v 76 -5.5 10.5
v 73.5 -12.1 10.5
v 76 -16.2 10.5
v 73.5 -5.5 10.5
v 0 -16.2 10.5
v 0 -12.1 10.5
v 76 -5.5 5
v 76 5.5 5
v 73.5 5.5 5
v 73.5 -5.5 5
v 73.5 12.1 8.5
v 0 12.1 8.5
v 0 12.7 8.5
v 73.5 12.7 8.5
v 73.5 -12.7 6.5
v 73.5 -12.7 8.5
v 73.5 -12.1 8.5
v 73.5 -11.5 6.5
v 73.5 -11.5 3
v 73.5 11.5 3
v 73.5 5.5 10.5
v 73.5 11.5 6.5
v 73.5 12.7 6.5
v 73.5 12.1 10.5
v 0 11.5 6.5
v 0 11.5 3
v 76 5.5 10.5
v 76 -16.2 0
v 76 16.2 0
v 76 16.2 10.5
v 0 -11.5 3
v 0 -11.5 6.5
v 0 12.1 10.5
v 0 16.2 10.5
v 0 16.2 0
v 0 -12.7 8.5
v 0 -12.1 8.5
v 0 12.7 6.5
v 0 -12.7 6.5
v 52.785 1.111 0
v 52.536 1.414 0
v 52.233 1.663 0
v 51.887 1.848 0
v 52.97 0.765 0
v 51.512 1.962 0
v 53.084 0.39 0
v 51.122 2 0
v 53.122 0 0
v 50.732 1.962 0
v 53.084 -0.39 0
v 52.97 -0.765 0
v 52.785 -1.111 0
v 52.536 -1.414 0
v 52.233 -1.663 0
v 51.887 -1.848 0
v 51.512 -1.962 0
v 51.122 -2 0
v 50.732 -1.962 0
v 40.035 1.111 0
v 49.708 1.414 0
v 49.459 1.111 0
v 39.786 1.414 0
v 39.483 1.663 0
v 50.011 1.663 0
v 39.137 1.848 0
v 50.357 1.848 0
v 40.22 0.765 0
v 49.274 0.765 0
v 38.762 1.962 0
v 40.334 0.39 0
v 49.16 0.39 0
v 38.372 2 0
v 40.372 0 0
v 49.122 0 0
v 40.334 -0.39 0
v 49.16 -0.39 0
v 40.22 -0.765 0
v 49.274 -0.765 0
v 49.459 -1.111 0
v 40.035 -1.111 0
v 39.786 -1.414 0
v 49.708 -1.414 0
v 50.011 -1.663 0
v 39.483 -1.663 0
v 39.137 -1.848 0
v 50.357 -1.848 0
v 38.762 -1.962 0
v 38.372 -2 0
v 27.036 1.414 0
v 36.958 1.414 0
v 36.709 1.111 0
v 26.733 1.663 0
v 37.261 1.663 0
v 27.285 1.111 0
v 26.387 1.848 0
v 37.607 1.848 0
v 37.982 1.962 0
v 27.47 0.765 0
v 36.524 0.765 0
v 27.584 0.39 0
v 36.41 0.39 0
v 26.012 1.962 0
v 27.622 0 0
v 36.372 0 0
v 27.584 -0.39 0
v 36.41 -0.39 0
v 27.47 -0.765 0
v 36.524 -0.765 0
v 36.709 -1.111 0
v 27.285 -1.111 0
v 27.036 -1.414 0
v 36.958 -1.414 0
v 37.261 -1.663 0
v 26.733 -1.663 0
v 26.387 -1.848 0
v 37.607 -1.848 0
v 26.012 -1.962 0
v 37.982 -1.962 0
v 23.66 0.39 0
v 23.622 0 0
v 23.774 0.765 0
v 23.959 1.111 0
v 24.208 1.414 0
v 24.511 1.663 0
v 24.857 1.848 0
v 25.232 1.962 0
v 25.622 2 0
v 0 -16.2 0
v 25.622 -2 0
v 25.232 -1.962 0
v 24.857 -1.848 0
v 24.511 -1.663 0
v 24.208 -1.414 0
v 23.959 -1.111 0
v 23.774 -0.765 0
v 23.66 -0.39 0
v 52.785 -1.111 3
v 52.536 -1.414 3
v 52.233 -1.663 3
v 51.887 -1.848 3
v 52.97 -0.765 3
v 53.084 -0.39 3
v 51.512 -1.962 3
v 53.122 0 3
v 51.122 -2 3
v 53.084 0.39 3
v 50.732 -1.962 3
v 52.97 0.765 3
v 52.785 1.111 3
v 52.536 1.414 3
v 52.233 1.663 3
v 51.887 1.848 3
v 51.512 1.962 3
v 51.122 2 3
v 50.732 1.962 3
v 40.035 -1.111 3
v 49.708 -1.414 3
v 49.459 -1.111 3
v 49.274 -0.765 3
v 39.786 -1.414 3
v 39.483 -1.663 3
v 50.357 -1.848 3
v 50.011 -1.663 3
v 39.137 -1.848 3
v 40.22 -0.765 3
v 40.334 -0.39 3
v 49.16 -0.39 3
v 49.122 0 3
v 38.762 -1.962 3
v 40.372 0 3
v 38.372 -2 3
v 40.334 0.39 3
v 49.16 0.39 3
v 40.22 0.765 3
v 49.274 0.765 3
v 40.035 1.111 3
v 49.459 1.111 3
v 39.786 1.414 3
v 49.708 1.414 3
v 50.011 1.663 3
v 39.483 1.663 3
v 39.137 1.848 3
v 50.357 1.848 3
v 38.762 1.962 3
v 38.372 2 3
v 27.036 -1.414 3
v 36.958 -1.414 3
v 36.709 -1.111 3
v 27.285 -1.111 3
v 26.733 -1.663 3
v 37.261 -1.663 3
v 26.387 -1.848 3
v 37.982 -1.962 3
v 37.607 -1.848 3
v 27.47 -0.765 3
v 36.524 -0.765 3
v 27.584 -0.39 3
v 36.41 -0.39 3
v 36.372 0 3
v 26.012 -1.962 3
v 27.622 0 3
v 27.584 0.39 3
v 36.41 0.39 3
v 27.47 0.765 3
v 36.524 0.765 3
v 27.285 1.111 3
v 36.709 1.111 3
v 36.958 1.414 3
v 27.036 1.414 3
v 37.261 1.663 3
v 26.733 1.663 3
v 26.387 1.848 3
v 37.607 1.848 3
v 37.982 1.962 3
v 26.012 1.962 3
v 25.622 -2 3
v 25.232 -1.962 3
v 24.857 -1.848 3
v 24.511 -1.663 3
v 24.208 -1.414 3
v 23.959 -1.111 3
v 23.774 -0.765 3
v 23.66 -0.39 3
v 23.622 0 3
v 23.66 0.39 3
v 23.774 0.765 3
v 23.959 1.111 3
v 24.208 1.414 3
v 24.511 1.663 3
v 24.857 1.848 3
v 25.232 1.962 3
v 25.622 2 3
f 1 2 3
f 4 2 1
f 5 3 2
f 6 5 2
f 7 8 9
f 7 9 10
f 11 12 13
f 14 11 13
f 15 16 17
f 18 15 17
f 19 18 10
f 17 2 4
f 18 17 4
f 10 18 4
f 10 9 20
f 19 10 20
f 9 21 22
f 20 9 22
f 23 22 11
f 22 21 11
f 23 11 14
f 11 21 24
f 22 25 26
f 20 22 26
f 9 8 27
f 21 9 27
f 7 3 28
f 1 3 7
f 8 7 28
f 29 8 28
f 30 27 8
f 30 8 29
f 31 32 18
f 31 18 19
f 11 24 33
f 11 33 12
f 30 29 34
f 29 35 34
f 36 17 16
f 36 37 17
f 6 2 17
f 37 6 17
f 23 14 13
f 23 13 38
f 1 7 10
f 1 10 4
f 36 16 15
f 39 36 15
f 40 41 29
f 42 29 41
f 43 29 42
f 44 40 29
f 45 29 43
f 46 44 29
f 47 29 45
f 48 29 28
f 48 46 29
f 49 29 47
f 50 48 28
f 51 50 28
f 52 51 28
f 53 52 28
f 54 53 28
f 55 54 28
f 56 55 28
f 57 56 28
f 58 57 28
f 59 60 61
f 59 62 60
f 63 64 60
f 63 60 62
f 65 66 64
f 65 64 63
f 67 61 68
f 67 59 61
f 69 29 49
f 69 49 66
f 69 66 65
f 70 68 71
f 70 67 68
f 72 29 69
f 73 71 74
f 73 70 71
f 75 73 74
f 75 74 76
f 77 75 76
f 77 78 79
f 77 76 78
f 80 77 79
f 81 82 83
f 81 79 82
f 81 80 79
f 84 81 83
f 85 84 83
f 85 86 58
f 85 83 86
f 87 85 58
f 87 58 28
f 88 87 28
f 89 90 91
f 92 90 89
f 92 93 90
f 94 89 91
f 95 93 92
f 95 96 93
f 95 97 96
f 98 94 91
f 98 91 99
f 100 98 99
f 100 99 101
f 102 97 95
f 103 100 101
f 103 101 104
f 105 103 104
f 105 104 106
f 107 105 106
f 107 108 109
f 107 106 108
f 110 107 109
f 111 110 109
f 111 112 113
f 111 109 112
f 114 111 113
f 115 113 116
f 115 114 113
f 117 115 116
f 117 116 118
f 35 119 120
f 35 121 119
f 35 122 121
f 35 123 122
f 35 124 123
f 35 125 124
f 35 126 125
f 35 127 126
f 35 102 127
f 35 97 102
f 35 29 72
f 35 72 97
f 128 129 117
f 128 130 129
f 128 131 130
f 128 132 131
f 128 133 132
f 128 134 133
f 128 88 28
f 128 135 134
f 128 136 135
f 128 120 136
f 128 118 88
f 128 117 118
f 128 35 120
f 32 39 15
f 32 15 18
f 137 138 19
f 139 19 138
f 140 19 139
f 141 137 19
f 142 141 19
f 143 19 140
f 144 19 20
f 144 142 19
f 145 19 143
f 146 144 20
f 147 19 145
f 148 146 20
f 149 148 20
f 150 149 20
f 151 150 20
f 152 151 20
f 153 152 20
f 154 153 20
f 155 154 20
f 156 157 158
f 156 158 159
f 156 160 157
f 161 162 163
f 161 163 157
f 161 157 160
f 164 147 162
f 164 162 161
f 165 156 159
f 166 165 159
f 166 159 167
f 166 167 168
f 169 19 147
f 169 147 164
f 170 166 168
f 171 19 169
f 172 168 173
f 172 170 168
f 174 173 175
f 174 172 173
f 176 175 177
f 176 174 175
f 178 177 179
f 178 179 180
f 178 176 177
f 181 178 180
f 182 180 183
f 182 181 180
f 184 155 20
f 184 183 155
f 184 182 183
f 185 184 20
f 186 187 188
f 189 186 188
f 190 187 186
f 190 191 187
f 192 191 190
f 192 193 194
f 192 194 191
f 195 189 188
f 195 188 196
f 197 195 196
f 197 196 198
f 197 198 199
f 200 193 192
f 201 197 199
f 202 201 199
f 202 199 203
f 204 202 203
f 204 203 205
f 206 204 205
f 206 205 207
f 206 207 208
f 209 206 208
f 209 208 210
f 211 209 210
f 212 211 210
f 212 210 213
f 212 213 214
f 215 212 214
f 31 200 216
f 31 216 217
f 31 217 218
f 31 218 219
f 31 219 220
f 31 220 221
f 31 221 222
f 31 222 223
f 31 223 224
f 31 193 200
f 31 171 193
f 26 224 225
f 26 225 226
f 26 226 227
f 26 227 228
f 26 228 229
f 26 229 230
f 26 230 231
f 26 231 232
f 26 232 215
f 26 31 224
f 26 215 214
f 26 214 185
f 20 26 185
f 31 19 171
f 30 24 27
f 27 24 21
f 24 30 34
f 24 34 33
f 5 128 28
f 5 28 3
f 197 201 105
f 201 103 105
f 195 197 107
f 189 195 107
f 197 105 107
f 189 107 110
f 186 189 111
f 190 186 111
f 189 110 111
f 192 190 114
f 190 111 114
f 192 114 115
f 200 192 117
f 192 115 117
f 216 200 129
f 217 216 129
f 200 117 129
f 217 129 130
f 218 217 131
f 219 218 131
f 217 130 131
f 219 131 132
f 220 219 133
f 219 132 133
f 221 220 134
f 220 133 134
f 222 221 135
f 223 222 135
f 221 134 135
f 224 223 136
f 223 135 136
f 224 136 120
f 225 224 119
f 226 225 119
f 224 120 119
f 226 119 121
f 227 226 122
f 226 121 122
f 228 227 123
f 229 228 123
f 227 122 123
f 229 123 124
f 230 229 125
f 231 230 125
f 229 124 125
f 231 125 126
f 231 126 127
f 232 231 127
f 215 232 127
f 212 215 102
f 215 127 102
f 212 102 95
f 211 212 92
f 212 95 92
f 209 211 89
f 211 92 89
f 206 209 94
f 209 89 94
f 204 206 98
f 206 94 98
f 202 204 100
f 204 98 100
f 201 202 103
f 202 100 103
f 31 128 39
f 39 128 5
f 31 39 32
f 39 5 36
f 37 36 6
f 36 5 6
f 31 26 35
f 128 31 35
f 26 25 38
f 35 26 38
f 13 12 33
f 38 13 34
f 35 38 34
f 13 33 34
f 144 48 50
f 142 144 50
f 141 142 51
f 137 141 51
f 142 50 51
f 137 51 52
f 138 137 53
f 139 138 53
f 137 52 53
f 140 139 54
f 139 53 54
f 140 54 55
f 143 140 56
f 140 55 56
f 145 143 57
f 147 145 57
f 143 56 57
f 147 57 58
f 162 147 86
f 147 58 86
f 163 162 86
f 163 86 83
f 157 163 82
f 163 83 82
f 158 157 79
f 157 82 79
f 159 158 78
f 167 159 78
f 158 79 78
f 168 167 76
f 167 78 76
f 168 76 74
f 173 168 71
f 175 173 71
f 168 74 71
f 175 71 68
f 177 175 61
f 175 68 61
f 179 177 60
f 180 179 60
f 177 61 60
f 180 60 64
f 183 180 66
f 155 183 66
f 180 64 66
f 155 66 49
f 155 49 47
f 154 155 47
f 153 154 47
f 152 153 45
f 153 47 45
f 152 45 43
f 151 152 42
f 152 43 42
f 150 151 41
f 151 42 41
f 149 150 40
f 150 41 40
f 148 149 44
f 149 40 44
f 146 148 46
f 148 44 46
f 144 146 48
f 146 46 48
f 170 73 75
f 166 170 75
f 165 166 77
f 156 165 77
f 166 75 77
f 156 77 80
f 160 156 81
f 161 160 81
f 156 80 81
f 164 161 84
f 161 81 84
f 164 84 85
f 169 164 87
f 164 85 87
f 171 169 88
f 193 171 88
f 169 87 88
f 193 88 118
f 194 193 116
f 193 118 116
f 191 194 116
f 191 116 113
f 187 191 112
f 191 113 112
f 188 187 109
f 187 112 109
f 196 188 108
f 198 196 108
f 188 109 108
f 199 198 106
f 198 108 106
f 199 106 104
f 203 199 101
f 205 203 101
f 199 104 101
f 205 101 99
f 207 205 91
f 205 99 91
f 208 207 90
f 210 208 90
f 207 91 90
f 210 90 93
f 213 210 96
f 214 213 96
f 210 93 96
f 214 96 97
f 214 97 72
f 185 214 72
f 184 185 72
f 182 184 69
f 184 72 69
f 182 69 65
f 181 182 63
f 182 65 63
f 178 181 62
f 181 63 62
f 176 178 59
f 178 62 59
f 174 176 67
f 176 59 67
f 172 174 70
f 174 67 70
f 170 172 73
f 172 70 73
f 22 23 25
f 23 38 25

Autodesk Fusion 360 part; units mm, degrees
sketch "Main Body" plane through (0, 0, 0) normal (1, 0, 0) x (0, 1, 0)
  line L0 (0, 0) -> (16.2, 0)
  line L1 (16.2, 0) -> (16.2, 10.5)
  line L2 (16.2, 10.5) -> (12.1, 10.5)
  line L3 (12.1, 10.5) -> (12.1, 8.5)
  line L4 (12.1, 8.5) -> (12.7, 8.5)
  line L5 (12.7, 8.5) -> (12.7, 6.5)
  line L6 (12.7, 6.5) -> (11.5, 6.5)
  line L7 (11.5, 6.5) -> (11.5, 3)
  line L8 (11.5, 3) -> (0, 3)
  line L9 (0, 35) -> (0, -40) construction
  line L10 (-12.1, 10.5) -> (-12.1, 8.5)
  line L11 (-11.5, 6.5) -> (-11.5, 3)
  line L12 (-12.1, 8.5) -> (-12.7, 8.5)
  line L13 (-12.7, 6.5) -> (-11.5, 6.5)
  line L14 (-12.7, 8.5) -> (-12.7, 6.5)
  line L15 (-16.2, 10.5) -> (-12.1, 10.5)
  line L16 (-16.2, 0) -> (-16.2, 10.5)
  line L17 (0, 0) -> (-16.2, 0)
  line L18 (-11.5, 3) -> (0, 3)
  dimension "d1" = 16.2
  dimension "d4" = 4.1
  dimension "d5" = 0.6
  dimension "d6" = 2
  dimension "d9" = 4.7
  dimension "d10" = 6.5
  dimension "d11" = 2
  dimension "d16" = 3
extrude "Extrude1" add sketch "Main Body" along normal blind 76
sketch "USB Endstop" plane through (76, 0, 0) normal (1, 0, 0) x (0, 1, 0)
  line L0 (-16.2, 0) -> (16.2, 0)
  line L1 (16.2, 0) -> (16.2, 10.5)
  line L2 (16.2, 10.5) -> (12.1, 10.5)
  line L3 (12.1, 10.5) -> (12.1, 8.5)
  line L4 (12.1, 8.5) -> (12.7, 8.5)
  line L5 (12.7, 8.5) -> (12.7, 6.5)
  line L6 (12.7, 6.5) -> (11.5, 6.5)
  line L7 (11.5, 6.5) -> (11.5, 3)
  line L8 (11.5, 3) -> (-11.5, 3)
  line L9 (-11.5, 3) -> (-11.5, 6.5)
  line L10 (-11.5, 6.5) -> (-12.7, 6.5)
  line L11 (-12.7, 6.5) -> (-12.7, 8.5)
  line L12 (-12.7, 8.5) -> (-12.1, 8.5)
  line L13 (-12.1, 8.5) -> (-12.1, 10.5)
  line L14 (-12.1, 10.5) -> (-16.2, 10.5)
  line L15 (-16.2, 10.5) -> (-16.2, 0)
  line L16 (0, 5) -> (5.5, 5)
  line L17 (5.5, 5) -> (5.5, 10.5)
  line L18 (5.5, 10.5) -> (12.1, 10.5)
  line L19 (0, 12) -> (0, -4) construction
  line L20 (-5.5, 5) -> (-5.5, 10.5)
  line L21 (-5.5, 10.5) -> (-12.1, 10.5)
  line L22 (0, 5) -> (-5.5, 5)
  dimension "d14" = 5.5
  dimension "d15" = 5
extrude "Extrude2" add sketch "USB Endstop" against normal blind 2.5 contours L3 L4 L5 L6 L7 L8 L9 L10 L11 L12 L13 L16 L17 L18 L20 L21 L22
sketch "DIN Holes" plane through (0, 0, 0) normal (0, 0, -1) x (1, 0, 0)
  line L0 (0, 16.2) -> (0, -16.2)
  line L1 (0, -16.2) -> (76, -16.2)
  line L2 (76, -16.2) -> (76, 16.2)
  line L3 (76, 16.2) -> (0, 16.2)
  line L4 (0, 16) -> (76, -16.2) construction
  line L5 (76.7439, 16.2) -> (0, -16.2) construction
  circle A0 centre (38.372, 0) radius 2
  circle A1 centre (25.622, 0) radius 2
  circle A2 centre (51.122, 0) radius 2
  dimension "d20" = 4
  dimension "d23" = 12.75
  dimension "d24" = 0
extrude "Extrude3" cut sketch "DIN Holes" against normal up to surface (3 mm away) contours A0 | A1 | A2
